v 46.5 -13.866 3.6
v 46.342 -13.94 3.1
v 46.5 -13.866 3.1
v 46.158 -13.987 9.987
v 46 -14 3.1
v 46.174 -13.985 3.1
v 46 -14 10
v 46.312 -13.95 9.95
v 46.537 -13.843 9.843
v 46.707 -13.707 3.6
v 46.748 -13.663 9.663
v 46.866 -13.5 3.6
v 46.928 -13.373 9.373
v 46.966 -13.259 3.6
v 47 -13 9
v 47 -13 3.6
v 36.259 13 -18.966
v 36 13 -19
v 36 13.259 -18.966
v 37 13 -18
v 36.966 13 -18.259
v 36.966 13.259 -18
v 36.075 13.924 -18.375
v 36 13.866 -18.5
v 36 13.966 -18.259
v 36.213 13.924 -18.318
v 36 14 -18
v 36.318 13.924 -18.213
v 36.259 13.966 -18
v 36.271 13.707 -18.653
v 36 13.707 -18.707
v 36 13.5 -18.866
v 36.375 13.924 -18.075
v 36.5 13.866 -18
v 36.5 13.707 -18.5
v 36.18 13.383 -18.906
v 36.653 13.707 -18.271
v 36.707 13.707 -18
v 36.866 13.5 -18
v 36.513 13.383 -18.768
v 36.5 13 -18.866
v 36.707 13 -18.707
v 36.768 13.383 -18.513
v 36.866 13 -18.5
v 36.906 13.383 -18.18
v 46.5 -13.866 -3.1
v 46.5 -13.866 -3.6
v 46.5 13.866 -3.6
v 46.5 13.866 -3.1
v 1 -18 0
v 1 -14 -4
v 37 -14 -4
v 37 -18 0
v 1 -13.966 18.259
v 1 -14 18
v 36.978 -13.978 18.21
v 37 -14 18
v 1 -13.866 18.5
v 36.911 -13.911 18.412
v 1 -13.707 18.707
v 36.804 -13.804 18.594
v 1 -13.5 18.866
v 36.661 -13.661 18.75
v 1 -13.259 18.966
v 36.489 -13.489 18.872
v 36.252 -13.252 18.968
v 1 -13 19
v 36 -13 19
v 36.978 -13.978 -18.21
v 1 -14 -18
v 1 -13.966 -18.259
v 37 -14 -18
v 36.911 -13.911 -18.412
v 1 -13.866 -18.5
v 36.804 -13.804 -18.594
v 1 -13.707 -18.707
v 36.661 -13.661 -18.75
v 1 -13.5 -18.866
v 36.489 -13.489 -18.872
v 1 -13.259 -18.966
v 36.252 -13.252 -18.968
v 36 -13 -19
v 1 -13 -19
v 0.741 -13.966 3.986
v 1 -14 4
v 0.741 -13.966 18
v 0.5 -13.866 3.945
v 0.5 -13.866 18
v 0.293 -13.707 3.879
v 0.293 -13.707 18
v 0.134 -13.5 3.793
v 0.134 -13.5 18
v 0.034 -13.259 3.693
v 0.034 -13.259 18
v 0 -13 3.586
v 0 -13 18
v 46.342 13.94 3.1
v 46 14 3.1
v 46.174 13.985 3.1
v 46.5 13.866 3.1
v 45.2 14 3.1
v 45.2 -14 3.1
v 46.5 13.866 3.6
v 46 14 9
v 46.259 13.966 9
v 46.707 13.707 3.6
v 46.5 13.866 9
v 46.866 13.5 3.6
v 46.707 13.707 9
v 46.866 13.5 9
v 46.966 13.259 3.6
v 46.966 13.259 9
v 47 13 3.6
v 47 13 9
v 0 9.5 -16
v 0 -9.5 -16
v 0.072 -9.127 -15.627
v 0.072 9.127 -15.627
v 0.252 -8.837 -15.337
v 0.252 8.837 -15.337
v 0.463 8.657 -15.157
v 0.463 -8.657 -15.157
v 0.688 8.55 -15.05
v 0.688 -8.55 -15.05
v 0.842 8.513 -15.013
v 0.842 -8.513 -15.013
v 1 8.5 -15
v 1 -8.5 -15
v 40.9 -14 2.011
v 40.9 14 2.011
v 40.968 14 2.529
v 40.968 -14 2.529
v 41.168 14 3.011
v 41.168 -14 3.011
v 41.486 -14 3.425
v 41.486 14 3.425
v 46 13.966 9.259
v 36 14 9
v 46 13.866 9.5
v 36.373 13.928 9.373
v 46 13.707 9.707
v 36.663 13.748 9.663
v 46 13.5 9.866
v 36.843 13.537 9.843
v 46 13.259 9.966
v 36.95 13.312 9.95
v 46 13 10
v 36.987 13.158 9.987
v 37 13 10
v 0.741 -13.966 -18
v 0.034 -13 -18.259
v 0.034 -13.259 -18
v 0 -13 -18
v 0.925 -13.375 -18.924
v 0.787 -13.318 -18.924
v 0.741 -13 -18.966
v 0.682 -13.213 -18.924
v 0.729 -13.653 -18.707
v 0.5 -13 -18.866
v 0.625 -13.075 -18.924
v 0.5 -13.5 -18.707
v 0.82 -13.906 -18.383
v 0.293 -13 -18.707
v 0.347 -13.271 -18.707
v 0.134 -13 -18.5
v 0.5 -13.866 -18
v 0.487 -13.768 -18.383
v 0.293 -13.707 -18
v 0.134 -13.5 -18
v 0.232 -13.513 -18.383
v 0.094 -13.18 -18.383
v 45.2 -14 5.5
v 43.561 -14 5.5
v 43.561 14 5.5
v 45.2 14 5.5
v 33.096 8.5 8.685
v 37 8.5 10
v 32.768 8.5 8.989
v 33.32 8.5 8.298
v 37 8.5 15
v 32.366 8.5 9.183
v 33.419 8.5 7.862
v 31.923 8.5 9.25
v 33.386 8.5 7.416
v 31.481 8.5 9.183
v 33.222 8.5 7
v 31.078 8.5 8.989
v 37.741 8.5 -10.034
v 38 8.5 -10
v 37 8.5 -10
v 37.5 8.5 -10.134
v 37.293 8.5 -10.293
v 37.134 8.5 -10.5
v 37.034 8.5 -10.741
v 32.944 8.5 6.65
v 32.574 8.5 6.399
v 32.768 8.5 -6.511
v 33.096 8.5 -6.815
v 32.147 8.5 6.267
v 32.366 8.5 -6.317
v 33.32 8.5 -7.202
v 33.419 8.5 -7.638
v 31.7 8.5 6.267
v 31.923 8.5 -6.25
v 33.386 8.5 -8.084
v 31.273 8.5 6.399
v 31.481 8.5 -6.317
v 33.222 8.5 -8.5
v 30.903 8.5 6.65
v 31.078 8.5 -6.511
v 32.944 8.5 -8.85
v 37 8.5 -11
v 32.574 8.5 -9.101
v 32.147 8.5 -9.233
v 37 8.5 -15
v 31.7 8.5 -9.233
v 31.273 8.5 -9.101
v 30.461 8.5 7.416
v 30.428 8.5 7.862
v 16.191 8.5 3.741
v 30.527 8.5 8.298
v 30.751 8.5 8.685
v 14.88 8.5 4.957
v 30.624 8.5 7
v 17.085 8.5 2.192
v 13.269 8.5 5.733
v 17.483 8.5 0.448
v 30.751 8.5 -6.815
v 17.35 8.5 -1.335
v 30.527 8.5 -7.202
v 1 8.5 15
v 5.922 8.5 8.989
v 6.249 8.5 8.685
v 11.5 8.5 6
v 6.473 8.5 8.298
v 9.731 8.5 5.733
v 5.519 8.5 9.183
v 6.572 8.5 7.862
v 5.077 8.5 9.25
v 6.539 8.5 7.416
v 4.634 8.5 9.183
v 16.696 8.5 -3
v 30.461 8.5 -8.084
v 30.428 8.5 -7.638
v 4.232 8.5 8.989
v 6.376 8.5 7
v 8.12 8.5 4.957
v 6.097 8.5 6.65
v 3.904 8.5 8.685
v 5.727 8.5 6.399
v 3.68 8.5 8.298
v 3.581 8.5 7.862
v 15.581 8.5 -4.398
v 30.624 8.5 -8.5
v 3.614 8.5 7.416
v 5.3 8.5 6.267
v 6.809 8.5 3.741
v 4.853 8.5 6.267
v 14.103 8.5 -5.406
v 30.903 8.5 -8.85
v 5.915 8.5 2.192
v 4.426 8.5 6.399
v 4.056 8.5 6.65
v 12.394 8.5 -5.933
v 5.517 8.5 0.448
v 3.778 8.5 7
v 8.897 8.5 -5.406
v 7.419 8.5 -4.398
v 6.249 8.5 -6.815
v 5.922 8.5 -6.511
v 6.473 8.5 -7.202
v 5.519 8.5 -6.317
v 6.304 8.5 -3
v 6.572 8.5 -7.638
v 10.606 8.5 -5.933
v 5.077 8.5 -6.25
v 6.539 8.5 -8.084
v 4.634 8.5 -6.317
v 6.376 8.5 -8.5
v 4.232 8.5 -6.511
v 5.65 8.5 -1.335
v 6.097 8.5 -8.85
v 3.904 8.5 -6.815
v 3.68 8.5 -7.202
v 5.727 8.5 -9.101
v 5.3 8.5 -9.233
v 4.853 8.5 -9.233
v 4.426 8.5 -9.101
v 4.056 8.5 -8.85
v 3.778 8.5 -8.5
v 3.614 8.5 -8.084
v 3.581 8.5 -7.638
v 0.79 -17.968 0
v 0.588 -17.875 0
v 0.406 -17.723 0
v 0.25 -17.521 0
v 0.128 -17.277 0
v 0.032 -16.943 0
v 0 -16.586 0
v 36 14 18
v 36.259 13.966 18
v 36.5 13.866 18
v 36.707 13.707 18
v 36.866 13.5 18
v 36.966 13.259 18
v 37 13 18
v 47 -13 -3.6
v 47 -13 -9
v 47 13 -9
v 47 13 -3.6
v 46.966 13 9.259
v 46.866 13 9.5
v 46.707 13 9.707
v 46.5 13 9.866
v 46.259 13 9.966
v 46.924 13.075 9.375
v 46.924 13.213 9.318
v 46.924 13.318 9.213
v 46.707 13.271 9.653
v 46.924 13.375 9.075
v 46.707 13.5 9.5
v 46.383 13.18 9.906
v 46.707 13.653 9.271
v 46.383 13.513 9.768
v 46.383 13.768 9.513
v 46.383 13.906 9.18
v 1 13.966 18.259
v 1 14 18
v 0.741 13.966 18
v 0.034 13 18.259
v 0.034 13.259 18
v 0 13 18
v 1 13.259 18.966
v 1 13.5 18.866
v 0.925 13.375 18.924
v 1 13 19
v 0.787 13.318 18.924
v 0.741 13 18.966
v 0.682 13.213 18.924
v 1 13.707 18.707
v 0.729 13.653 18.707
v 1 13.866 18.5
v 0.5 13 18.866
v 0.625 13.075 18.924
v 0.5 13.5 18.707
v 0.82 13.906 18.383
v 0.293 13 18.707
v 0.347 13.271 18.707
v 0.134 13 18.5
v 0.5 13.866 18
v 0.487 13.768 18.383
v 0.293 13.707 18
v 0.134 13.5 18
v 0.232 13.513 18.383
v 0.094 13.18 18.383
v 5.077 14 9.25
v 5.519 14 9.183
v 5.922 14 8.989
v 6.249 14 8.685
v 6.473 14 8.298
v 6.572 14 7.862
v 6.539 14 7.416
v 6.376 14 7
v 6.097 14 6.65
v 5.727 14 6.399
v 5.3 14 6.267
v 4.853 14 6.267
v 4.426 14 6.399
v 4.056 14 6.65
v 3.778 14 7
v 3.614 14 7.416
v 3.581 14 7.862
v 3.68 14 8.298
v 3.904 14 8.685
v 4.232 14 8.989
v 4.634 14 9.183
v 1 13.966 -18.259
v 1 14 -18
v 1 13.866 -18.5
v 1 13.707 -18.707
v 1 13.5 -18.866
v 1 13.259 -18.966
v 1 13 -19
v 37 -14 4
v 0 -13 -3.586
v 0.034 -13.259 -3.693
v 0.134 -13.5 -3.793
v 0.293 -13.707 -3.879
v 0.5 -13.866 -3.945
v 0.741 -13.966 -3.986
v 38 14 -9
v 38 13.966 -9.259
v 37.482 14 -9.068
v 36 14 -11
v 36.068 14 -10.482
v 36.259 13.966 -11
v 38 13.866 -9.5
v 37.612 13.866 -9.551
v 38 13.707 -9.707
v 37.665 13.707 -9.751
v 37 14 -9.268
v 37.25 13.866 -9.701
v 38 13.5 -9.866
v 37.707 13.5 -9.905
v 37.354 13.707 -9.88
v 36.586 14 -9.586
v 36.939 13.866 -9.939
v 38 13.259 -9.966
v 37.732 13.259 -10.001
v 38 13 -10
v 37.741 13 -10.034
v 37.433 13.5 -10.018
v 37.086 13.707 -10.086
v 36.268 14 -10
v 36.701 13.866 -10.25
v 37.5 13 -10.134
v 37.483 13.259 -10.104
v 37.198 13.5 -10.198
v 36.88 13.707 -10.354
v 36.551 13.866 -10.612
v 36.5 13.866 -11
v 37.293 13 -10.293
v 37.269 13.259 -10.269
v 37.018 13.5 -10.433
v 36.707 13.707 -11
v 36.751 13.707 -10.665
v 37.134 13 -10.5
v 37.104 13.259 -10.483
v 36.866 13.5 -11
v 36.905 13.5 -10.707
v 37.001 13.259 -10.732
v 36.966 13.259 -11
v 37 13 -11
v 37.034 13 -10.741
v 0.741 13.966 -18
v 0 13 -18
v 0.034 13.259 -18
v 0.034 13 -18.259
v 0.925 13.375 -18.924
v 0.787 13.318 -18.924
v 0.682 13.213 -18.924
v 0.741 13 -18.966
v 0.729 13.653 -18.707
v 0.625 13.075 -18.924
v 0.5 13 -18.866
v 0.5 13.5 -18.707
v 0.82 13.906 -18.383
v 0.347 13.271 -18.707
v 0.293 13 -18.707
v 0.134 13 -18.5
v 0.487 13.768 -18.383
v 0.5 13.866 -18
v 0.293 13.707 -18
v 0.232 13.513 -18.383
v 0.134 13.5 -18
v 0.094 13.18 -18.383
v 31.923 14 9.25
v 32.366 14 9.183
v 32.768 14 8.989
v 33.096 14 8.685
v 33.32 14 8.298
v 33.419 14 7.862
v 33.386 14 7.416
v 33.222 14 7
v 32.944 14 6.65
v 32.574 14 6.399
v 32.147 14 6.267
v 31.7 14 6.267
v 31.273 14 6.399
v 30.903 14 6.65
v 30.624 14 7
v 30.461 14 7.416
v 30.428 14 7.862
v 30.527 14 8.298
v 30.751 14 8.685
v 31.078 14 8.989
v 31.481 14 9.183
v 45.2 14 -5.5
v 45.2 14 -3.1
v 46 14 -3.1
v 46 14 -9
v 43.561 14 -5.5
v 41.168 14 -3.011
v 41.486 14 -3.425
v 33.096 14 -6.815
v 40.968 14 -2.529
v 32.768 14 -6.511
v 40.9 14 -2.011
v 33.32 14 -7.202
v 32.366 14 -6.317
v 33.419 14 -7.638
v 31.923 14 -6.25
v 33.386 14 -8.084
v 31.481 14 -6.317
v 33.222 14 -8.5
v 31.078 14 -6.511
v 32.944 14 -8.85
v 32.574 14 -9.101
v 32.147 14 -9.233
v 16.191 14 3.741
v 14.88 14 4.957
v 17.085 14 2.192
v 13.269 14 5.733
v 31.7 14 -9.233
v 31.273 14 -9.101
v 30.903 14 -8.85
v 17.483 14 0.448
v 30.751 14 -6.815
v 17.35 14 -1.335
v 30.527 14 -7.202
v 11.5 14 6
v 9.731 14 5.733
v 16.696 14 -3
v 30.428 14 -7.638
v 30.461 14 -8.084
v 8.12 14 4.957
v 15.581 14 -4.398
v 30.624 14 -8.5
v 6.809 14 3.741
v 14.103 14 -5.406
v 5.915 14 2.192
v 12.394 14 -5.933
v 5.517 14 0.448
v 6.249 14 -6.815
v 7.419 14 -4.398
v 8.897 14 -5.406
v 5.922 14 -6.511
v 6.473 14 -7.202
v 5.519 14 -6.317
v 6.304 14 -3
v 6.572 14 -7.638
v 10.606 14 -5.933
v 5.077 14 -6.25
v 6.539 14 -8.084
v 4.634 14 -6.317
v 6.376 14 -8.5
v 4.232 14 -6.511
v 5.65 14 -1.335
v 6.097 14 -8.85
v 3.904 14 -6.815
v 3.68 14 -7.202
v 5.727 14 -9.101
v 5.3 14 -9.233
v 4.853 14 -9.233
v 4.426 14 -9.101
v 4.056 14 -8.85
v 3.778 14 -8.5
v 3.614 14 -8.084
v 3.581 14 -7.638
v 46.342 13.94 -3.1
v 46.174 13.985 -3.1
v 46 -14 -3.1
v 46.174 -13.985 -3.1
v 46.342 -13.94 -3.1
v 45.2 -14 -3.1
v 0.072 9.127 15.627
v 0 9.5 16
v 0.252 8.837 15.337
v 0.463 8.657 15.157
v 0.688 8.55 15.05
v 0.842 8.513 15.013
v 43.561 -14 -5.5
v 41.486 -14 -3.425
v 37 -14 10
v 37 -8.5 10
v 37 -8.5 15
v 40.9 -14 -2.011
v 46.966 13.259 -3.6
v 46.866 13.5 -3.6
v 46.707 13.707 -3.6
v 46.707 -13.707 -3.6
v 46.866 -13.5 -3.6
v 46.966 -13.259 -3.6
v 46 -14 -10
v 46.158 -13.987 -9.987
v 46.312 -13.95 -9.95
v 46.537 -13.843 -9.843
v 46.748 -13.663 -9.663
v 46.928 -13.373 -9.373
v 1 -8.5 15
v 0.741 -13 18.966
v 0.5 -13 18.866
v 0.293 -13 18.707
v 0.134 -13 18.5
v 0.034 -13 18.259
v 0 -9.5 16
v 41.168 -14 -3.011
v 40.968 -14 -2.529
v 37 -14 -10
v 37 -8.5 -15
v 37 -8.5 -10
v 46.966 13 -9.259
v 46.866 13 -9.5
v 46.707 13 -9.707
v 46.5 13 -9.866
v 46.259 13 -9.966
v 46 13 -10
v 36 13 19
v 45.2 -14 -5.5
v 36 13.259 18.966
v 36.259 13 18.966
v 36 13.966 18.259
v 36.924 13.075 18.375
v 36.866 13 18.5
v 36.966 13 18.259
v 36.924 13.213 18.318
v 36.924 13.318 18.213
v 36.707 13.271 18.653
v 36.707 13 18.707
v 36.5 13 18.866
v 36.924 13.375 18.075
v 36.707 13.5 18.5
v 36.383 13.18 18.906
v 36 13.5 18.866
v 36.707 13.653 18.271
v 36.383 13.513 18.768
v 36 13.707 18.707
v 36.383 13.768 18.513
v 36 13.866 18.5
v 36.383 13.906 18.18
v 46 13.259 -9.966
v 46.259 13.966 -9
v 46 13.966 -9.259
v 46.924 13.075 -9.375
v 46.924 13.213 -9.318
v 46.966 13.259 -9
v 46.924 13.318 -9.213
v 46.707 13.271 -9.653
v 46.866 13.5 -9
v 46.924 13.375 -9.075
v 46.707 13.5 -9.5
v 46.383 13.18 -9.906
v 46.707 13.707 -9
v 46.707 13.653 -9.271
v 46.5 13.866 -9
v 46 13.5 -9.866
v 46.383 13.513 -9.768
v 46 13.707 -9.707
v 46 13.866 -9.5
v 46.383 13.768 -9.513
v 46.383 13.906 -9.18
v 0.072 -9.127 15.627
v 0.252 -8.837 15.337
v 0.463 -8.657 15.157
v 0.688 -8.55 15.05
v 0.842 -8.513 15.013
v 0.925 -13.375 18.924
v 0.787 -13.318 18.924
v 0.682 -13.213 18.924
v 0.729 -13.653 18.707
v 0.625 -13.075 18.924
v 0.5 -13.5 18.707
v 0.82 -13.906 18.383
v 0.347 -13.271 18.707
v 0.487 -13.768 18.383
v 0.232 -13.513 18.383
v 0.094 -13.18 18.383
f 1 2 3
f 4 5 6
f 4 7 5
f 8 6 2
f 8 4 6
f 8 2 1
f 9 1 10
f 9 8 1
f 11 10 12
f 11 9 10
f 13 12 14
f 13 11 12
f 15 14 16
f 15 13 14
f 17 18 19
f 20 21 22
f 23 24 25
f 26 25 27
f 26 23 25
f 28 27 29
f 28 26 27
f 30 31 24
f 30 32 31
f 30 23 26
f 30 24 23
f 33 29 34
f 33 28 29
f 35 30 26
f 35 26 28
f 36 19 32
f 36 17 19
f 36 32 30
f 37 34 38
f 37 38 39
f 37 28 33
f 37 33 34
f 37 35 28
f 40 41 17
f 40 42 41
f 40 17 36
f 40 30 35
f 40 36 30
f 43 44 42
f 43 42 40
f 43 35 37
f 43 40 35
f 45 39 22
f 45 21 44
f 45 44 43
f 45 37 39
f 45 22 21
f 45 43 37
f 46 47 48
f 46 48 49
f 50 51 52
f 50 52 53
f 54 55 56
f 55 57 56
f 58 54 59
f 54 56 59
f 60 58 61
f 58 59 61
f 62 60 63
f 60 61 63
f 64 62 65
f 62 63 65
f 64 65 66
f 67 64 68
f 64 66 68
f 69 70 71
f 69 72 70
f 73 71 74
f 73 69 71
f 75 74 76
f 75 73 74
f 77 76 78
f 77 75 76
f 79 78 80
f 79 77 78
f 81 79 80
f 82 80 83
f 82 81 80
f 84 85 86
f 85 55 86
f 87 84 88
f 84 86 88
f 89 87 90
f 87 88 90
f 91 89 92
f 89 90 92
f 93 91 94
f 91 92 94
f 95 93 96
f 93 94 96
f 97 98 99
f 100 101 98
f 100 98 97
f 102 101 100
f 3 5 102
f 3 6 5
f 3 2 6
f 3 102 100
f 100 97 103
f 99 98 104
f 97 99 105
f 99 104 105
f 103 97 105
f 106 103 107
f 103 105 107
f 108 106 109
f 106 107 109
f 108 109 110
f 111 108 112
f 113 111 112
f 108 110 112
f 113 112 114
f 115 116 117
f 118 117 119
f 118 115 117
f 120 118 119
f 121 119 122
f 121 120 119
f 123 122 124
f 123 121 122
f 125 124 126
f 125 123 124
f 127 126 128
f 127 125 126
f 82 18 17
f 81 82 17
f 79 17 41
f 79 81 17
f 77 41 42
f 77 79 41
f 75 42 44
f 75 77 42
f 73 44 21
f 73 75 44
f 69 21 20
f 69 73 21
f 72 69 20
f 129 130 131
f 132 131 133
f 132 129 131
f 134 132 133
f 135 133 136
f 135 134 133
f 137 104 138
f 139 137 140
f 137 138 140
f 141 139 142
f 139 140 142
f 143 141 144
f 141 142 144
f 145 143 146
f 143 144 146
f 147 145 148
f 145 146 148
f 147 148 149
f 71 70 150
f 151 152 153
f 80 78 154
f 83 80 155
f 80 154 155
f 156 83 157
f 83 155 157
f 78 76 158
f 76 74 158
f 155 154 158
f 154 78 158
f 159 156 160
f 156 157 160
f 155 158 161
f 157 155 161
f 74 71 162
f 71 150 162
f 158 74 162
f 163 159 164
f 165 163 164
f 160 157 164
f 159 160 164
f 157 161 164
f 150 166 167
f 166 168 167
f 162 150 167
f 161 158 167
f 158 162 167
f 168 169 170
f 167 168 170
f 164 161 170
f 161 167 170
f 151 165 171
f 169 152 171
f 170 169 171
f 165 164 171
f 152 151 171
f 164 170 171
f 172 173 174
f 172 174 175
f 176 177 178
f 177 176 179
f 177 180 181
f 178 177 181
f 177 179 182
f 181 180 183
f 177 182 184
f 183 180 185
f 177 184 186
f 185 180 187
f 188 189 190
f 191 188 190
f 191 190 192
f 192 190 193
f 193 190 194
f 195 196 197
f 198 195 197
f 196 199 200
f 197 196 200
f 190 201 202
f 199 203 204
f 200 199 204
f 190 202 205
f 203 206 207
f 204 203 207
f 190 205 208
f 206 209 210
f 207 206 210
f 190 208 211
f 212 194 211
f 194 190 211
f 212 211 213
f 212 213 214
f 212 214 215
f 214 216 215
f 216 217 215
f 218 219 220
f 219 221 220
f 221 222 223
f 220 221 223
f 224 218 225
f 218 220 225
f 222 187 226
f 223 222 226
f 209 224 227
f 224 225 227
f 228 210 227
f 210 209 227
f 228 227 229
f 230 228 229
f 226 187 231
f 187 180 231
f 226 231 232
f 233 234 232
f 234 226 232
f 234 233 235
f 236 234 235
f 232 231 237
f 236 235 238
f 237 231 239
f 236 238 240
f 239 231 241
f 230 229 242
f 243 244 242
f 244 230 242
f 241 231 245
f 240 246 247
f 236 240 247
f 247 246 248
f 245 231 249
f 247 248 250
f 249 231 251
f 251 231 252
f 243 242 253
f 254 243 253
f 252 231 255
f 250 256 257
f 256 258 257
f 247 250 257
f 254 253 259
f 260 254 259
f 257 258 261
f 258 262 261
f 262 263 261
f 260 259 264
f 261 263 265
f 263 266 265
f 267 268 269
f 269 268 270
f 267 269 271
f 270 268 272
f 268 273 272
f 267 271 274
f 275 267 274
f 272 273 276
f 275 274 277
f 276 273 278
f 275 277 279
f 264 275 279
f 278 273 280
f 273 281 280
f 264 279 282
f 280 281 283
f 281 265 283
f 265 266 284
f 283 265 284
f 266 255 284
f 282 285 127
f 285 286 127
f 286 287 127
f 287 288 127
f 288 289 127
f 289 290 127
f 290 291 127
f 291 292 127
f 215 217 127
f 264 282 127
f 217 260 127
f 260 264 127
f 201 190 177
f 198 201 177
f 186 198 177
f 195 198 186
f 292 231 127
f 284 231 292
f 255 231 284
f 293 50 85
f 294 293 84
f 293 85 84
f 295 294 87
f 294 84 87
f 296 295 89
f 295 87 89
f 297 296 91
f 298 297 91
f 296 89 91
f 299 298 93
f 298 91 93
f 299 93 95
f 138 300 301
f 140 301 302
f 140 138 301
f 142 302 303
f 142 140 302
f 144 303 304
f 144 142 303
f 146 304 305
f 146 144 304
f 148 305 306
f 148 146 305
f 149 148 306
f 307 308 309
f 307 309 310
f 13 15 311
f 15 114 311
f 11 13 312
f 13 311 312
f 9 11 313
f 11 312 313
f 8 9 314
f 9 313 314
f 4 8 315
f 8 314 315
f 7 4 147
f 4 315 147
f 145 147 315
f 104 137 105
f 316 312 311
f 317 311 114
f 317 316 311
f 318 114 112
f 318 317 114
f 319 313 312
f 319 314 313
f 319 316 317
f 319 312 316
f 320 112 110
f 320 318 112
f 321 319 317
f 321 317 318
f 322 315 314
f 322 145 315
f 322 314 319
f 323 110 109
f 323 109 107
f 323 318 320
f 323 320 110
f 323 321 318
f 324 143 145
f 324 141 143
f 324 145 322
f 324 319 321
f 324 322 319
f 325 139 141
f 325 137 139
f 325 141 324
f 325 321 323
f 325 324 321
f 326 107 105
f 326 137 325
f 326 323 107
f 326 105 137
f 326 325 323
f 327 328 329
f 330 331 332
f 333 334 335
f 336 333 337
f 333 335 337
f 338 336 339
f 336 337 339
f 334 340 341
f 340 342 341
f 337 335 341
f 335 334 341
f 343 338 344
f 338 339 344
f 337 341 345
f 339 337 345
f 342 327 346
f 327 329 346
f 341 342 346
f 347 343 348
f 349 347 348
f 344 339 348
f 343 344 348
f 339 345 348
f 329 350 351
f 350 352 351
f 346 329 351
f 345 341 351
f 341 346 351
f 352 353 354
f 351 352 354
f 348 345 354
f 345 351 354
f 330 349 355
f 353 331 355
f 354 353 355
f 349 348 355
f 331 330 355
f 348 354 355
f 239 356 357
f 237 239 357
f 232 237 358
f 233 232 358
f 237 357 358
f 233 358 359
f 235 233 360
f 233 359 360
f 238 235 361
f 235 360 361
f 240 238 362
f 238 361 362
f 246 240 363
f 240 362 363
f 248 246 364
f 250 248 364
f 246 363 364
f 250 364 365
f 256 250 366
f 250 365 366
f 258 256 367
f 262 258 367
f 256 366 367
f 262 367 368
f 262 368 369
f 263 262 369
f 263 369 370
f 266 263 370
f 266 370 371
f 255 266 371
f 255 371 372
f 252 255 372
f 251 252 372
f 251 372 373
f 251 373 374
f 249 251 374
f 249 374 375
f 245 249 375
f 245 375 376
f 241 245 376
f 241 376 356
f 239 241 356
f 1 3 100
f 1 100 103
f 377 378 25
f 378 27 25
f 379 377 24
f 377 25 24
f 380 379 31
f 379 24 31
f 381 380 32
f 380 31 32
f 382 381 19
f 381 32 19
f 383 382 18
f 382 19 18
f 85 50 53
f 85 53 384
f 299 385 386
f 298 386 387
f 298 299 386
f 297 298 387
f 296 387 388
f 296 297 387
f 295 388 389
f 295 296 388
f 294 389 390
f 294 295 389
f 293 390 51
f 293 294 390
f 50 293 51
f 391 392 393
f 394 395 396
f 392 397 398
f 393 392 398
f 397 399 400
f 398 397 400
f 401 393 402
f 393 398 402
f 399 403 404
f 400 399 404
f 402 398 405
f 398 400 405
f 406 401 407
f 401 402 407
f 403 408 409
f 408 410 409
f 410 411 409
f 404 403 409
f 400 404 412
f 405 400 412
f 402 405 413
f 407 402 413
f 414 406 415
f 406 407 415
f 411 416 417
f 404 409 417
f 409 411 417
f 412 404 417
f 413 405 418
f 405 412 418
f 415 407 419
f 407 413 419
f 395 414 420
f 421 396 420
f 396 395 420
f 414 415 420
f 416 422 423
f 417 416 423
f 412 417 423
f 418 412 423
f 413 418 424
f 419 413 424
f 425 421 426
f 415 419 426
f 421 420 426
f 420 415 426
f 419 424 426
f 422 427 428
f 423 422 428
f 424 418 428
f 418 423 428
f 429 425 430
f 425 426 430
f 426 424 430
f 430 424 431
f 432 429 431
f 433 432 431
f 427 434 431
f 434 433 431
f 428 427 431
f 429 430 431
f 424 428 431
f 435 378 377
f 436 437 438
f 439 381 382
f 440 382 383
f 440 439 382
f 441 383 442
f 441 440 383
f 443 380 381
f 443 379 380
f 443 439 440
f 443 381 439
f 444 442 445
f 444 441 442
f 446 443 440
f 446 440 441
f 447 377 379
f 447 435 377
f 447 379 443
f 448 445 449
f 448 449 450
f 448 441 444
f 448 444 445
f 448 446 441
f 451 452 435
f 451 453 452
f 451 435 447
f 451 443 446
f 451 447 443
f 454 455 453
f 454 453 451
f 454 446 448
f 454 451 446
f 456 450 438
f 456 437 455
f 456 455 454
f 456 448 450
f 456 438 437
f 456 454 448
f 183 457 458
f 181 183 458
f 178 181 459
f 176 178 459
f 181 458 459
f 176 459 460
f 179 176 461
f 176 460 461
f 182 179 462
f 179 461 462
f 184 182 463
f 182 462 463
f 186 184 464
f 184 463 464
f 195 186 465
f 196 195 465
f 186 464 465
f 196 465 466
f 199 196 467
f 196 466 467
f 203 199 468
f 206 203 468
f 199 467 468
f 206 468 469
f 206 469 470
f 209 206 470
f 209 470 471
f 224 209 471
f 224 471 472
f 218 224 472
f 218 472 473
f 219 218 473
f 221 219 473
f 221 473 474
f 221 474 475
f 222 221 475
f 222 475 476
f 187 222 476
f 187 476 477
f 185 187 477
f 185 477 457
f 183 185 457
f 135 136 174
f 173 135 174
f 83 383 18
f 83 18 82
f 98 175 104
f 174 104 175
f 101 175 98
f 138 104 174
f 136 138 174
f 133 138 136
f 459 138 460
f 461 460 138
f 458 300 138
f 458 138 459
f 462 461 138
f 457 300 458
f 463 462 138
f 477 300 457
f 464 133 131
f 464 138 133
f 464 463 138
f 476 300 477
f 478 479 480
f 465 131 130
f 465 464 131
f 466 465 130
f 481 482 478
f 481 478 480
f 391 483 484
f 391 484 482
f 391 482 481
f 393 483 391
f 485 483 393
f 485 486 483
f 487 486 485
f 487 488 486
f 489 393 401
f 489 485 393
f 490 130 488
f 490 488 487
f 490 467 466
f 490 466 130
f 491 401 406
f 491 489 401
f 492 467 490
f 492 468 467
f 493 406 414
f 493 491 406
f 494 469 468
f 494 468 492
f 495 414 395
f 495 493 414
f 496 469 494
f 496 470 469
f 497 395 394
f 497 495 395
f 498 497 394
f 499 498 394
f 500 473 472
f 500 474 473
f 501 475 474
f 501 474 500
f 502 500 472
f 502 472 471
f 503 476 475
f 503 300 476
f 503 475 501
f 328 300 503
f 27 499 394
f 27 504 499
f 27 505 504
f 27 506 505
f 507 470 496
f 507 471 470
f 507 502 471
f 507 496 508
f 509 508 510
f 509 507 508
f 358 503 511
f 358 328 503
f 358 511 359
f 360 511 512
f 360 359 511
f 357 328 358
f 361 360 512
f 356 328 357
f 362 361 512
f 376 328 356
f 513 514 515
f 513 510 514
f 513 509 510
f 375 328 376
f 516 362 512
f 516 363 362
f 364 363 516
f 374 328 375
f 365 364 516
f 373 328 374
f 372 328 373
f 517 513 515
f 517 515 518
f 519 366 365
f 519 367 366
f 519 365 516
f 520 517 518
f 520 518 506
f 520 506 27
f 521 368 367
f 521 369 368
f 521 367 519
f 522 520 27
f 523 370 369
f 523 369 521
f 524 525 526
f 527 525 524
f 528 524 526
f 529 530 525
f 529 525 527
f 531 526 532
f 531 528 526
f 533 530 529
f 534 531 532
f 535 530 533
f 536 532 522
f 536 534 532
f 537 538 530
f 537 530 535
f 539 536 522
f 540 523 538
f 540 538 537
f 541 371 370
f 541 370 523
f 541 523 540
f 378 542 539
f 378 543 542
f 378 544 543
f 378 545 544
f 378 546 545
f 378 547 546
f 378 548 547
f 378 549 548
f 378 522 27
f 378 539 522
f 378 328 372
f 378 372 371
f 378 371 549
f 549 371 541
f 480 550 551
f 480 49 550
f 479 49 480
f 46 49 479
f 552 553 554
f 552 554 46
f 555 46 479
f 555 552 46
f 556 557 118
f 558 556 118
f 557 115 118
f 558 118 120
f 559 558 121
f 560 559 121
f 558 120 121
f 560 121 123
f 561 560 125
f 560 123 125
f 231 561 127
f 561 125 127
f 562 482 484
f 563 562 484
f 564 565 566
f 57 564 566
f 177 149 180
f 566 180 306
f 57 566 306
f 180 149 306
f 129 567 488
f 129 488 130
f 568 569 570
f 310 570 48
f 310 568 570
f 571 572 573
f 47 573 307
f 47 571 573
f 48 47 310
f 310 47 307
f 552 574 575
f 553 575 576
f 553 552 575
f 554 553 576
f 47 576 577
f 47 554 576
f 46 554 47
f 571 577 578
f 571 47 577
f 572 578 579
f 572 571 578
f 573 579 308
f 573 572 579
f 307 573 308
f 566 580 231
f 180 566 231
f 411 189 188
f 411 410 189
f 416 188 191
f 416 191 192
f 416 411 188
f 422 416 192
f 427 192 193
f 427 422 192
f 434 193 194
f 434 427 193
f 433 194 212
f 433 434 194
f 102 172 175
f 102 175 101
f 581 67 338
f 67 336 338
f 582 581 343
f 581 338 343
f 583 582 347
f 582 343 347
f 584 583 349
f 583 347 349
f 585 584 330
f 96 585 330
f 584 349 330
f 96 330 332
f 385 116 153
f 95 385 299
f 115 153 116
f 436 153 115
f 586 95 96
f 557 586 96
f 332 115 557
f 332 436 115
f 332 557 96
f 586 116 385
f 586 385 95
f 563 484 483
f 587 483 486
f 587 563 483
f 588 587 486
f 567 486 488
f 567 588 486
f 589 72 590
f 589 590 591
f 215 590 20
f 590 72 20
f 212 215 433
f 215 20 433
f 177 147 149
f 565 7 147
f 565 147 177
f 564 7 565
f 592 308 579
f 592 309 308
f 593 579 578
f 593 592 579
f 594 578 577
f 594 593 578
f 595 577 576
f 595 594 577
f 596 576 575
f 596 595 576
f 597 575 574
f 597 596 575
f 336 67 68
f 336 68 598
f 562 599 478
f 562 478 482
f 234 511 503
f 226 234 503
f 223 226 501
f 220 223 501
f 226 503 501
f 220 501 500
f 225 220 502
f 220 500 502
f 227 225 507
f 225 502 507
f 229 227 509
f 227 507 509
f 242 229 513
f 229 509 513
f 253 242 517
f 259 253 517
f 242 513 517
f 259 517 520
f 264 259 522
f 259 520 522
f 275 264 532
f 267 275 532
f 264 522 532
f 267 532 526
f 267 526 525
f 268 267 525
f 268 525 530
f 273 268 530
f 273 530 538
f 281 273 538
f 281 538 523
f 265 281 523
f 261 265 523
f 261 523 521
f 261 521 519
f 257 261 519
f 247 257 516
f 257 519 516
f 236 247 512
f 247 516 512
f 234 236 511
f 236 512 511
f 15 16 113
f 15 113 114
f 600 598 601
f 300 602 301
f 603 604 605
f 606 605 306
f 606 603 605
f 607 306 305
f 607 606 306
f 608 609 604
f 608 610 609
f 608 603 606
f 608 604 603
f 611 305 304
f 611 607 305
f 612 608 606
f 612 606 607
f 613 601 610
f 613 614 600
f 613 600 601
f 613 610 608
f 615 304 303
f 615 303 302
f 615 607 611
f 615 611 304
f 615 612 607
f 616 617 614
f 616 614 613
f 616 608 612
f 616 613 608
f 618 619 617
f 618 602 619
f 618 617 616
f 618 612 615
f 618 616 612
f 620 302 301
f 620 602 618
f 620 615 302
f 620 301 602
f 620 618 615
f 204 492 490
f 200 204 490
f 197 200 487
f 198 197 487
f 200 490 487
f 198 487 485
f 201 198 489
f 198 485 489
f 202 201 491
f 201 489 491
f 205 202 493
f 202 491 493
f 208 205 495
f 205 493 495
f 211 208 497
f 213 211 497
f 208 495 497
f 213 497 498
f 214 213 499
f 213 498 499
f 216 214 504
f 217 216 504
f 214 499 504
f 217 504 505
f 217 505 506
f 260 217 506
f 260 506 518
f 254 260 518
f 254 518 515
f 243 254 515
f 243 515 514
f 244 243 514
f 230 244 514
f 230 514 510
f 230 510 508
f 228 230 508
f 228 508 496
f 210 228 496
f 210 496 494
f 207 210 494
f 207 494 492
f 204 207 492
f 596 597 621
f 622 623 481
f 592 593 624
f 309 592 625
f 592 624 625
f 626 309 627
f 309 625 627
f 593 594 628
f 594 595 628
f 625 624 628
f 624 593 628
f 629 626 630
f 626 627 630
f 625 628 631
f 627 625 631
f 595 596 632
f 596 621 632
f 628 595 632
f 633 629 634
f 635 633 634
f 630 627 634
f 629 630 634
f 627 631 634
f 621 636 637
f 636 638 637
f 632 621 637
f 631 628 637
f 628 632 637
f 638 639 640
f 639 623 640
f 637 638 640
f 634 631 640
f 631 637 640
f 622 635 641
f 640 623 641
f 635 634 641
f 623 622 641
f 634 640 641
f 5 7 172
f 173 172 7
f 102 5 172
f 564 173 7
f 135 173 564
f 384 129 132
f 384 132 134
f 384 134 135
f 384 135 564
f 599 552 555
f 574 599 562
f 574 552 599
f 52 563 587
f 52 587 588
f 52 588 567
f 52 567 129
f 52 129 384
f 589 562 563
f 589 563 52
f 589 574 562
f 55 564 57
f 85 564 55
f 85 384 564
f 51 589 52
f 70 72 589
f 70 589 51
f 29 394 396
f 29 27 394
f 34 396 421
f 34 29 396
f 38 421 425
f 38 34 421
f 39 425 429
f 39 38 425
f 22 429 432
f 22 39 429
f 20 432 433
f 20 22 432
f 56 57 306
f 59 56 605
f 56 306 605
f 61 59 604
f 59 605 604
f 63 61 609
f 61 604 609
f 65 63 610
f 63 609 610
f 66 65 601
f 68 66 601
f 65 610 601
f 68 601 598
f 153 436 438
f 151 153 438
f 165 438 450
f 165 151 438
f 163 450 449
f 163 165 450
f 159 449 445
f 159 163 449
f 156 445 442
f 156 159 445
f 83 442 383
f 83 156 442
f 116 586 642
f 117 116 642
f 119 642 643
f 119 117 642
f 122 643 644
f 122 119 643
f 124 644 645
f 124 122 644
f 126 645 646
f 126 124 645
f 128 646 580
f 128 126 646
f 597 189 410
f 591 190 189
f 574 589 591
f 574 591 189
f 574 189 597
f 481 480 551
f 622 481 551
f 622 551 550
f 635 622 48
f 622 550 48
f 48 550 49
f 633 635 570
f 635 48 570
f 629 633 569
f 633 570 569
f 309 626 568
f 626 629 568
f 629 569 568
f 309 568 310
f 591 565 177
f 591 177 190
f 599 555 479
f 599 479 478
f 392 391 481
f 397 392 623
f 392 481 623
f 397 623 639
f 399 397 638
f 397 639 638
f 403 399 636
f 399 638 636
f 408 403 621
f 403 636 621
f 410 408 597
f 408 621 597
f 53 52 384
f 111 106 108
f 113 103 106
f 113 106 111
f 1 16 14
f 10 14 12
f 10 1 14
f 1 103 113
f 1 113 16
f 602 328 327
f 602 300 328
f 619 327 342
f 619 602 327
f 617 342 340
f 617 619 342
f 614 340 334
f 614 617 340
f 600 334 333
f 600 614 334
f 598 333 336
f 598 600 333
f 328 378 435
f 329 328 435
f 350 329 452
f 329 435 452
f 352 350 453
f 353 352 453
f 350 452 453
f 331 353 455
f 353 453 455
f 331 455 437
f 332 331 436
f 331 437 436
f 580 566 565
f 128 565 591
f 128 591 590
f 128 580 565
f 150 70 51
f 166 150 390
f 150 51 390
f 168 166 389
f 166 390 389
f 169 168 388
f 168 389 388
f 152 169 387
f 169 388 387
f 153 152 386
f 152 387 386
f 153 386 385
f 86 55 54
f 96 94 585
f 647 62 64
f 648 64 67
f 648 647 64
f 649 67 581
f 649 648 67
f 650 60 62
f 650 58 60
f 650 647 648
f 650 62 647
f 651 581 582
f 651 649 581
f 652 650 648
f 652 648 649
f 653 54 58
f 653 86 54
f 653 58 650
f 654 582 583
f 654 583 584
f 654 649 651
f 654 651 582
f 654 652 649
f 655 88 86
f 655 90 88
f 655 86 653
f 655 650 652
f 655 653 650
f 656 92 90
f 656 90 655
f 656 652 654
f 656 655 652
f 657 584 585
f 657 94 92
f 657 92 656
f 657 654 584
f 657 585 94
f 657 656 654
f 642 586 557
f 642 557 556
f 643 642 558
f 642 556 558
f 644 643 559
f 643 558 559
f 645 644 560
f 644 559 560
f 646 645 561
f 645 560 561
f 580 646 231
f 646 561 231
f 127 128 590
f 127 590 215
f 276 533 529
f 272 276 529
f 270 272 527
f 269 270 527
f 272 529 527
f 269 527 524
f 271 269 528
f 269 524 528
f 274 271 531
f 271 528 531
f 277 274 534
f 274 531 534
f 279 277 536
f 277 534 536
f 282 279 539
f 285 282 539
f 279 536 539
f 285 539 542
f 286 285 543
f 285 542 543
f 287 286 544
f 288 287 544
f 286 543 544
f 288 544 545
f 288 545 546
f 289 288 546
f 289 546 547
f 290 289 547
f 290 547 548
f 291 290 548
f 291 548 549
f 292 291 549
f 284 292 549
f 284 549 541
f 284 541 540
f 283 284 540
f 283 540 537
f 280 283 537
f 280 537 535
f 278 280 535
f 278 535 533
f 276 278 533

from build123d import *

# Parameters (mm, degrees)
SKETCH2_W           = 30
SKETCH2_H           = 17
BOSS_EXTRUDE1_DEPTH = 37
SKETCH3_R           = 6
CUT_EXTRUDE1_DEPTH  = 5.5
CUT_EXTRUDE3_REACH  = 54.479
SKETCH4_R           = 1.5
BOSS_EXTRUDE2_REACH = 52.14
FILLET1_R           = 1


with BuildPart() as part:
    # Sketch2 → Boss-Extrude1 (new body)
    with BuildSketch(Plane(origin=(0, 0, 0), x_dir=(0, 0, -1), z_dir=(1, 0, 0))):
        Polygon((19, -14), (3.999996995, -14), (0, -17.999996995), (-3.999996995, -14), (-19, -14), (-19, 14), (19, 14), align=None)
        Rectangle(SKETCH2_W, SKETCH2_H, mode=Mode.SUBTRACT)
    extrude(amount=BOSS_EXTRUDE1_DEPTH)

    # Sketch3 → Cut-Extrude1 (cut)
    with BuildSketch(Plane(origin=(0, 14, 0), x_dir=(1, 0, 0), z_dir=(0, 1, 0))):
        with Locations(Location((11.5, 0, 0), (0, 0, 270))):
            Circle(SKETCH3_R)
    extrude(amount=-CUT_EXTRUDE1_DEPTH, mode=Mode.SUBTRACT)

    # Sketch4 → Cut-Extrude3 (cut, up to next)
    with BuildSketch(Plane(origin=(0, 14, 0), x_dir=(1, 0, 0), z_dir=(0, 1, 0)), mode=Mode.PRIVATE) as cut_extrude3_sk1:
        with Locations(Location((5.076606241, 7.75, 0), (0, 0, 270))):
            Circle(SKETCH4_R)
    cut_extrude3_tool1 = extrude(cut_extrude3_sk1.sketch, amount=-CUT_EXTRUDE3_REACH, mode=Mode.PRIVATE) & part.part
    # Sketch4 → Cut-Extrude3 (cut, up to next)
    with BuildSketch(Plane(origin=(0, 14, 0), x_dir=(1, 0, 0), z_dir=(0, 1, 0)), mode=Mode.PRIVATE) as cut_extrude3_sk2:
        with Locations(Location((31.923393759, 7.75, 0), (0, 0, 270))):
            Circle(SKETCH4_R)
    cut_extrude3_tool2 = extrude(cut_extrude3_sk2.sketch, amount=-CUT_EXTRUDE3_REACH, mode=Mode.PRIVATE) & part.part
    # Sketch4 → Cut-Extrude3 (cut, up to next)
    with BuildSketch(Plane(origin=(0, 14, 0), x_dir=(1, 0, 0), z_dir=(0, 1, 0)), mode=Mode.PRIVATE) as cut_extrude3_sk3:
        with Locations(Location((31.923393759, -7.75, 0), (0, 0, 270))):
            Circle(SKETCH4_R)
    cut_extrude3_tool3 = extrude(cut_extrude3_sk3.sketch, amount=-CUT_EXTRUDE3_REACH, mode=Mode.PRIVATE) & part.part
    # Sketch4 → Cut-Extrude3 (cut, up to next)
    with BuildSketch(Plane(origin=(0, 14, 0), x_dir=(1, 0, 0), z_dir=(0, 1, 0)), mode=Mode.PRIVATE) as cut_extrude3_sk4:
        with Locations(Location((5.076606241, -7.75, 0), (0, 0, 270))):
            Circle(SKETCH4_R)
    cut_extrude3_tool4 = extrude(cut_extrude3_sk4.sketch, amount=-CUT_EXTRUDE3_REACH, mode=Mode.PRIVATE) & part.part
    add(cut_extrude3_tool1.solids().sort_by_distance((5.076606, 14, -7.75))[0], mode=Mode.SUBTRACT)
    add(cut_extrude3_tool2.solids().sort_by_distance((31.923394, 14, -7.75))[0], mode=Mode.SUBTRACT)
    add(cut_extrude3_tool3.solids().sort_by_distance((31.923394, 14, 7.75))[0], mode=Mode.SUBTRACT)
    add(cut_extrude3_tool4.solids().sort_by_distance((5.076606, 14, 7.75))[0], mode=Mode.SUBTRACT)

    # Boss-Extrude2: up to this face of the body (flat: up to its plane)
    boss_extrude2_end = Plane(part.part.faces().sort_by_distance((19.126018989, 14, 0))[0])
    # Sketch6 → Boss-Extrude2 (add, up to the picked face)
    with BuildSketch(Plane(origin=(0, -14, 0), x_dir=(1, 0, 0), z_dir=(0, 1, 0)), mode=Mode.PRIVATE) as boss_extrude2_sk1:
        with BuildLine():
            Line((47, 3.6), (46.5, 3.6))
            Line((46.5, 3.6), (46.5, 3.1))
            Line((46.5, 3.1), (45.2, 3.1))
            Line((45.2, 3.1), (45.2, 5.5))
            Line((45.2, 5.5), (43.560660172, 5.5))
            Line((43.560660172, 5.5), (41.485786438, 3.425126266))
            ThreePointArc((41.485786438, 3.425126266), (41.052240935, 2.776279568), (40.9, 2.010912703))
            Line((40.9, 2.010912703), (40.9, -2.010912703))
            ThreePointArc((40.9, -2.010912703), (41.052240935, -2.776279568), (41.485786438, -3.425126266))
            Line((41.485786438, -3.425126266), (43.560660172, -5.5))
            Line((43.560660172, -5.5), (45.2, -5.5))
            Line((45.2, -5.5), (45.2, -3.1))
            Line((45.2, -3.1), (46.5, -3.1))
            Line((46.5, -3.1), (46.5, -3.6))
            Line((46.5, -3.6), (47, -3.6))
            Line((47, -3.6), (47, -10))
            Line((47, -10), (37, -10))
            Line((37, -10), (37, 10))
            Line((37, 10), (47, 10))
            Line((47, 10), (47, 3.6))
        make_face()
    boss_extrude2_tool1 = split(extrude(boss_extrude2_sk1.sketch, amount=BOSS_EXTRUDE2_REACH, mode=Mode.PRIVATE), bisect_by=boss_extrude2_end, keep=Keep.BOTH, mode=Mode.PRIVATE)
    add(boss_extrude2_tool1.solids().sort_by(Axis((46.75, -14, -3.823607), (0, 1, 0)))[0])

    # Fillet1
    fillet1_edges = [part.edges().sort_by_distance(p)[0] for p in [
        (42, 14, -10),
        (0, -8.5, 0),
        (0, 0, 15),
        (0, 8.5, 0),
        (0, 0, -15),
        (0, -14, 11.499998498),
        (0, -15.999998498, 1.999998498),
        (0, -15.999998498, -1.999998498),
        (0, -14, -11.499998498),
        (0, 14, 0),
        (18.5, -14, -19),
        (37, 0, -19),
        (18.5, 14, -19),
        (0, 0, -19),
        (18.5, 14, 19),
        (37, 0, 19),
        (18.5, -14, 19),
        (0, 0, 19),
        (37, 14, -14.5),
        (37, 11.25, -10),
        (42, 14, 10),
        (37, 14, 14.5),
        (47, 0, -10),
        (47, 0, 10),
        (47, 14, 6.8),
        (47, -14, 6.8),
        (47, 14, -6.8),
        (47, -14, -6.8),
    ]]
    fillet(fillet1_edges, radius=FILLET1_R)


solid = part.part
